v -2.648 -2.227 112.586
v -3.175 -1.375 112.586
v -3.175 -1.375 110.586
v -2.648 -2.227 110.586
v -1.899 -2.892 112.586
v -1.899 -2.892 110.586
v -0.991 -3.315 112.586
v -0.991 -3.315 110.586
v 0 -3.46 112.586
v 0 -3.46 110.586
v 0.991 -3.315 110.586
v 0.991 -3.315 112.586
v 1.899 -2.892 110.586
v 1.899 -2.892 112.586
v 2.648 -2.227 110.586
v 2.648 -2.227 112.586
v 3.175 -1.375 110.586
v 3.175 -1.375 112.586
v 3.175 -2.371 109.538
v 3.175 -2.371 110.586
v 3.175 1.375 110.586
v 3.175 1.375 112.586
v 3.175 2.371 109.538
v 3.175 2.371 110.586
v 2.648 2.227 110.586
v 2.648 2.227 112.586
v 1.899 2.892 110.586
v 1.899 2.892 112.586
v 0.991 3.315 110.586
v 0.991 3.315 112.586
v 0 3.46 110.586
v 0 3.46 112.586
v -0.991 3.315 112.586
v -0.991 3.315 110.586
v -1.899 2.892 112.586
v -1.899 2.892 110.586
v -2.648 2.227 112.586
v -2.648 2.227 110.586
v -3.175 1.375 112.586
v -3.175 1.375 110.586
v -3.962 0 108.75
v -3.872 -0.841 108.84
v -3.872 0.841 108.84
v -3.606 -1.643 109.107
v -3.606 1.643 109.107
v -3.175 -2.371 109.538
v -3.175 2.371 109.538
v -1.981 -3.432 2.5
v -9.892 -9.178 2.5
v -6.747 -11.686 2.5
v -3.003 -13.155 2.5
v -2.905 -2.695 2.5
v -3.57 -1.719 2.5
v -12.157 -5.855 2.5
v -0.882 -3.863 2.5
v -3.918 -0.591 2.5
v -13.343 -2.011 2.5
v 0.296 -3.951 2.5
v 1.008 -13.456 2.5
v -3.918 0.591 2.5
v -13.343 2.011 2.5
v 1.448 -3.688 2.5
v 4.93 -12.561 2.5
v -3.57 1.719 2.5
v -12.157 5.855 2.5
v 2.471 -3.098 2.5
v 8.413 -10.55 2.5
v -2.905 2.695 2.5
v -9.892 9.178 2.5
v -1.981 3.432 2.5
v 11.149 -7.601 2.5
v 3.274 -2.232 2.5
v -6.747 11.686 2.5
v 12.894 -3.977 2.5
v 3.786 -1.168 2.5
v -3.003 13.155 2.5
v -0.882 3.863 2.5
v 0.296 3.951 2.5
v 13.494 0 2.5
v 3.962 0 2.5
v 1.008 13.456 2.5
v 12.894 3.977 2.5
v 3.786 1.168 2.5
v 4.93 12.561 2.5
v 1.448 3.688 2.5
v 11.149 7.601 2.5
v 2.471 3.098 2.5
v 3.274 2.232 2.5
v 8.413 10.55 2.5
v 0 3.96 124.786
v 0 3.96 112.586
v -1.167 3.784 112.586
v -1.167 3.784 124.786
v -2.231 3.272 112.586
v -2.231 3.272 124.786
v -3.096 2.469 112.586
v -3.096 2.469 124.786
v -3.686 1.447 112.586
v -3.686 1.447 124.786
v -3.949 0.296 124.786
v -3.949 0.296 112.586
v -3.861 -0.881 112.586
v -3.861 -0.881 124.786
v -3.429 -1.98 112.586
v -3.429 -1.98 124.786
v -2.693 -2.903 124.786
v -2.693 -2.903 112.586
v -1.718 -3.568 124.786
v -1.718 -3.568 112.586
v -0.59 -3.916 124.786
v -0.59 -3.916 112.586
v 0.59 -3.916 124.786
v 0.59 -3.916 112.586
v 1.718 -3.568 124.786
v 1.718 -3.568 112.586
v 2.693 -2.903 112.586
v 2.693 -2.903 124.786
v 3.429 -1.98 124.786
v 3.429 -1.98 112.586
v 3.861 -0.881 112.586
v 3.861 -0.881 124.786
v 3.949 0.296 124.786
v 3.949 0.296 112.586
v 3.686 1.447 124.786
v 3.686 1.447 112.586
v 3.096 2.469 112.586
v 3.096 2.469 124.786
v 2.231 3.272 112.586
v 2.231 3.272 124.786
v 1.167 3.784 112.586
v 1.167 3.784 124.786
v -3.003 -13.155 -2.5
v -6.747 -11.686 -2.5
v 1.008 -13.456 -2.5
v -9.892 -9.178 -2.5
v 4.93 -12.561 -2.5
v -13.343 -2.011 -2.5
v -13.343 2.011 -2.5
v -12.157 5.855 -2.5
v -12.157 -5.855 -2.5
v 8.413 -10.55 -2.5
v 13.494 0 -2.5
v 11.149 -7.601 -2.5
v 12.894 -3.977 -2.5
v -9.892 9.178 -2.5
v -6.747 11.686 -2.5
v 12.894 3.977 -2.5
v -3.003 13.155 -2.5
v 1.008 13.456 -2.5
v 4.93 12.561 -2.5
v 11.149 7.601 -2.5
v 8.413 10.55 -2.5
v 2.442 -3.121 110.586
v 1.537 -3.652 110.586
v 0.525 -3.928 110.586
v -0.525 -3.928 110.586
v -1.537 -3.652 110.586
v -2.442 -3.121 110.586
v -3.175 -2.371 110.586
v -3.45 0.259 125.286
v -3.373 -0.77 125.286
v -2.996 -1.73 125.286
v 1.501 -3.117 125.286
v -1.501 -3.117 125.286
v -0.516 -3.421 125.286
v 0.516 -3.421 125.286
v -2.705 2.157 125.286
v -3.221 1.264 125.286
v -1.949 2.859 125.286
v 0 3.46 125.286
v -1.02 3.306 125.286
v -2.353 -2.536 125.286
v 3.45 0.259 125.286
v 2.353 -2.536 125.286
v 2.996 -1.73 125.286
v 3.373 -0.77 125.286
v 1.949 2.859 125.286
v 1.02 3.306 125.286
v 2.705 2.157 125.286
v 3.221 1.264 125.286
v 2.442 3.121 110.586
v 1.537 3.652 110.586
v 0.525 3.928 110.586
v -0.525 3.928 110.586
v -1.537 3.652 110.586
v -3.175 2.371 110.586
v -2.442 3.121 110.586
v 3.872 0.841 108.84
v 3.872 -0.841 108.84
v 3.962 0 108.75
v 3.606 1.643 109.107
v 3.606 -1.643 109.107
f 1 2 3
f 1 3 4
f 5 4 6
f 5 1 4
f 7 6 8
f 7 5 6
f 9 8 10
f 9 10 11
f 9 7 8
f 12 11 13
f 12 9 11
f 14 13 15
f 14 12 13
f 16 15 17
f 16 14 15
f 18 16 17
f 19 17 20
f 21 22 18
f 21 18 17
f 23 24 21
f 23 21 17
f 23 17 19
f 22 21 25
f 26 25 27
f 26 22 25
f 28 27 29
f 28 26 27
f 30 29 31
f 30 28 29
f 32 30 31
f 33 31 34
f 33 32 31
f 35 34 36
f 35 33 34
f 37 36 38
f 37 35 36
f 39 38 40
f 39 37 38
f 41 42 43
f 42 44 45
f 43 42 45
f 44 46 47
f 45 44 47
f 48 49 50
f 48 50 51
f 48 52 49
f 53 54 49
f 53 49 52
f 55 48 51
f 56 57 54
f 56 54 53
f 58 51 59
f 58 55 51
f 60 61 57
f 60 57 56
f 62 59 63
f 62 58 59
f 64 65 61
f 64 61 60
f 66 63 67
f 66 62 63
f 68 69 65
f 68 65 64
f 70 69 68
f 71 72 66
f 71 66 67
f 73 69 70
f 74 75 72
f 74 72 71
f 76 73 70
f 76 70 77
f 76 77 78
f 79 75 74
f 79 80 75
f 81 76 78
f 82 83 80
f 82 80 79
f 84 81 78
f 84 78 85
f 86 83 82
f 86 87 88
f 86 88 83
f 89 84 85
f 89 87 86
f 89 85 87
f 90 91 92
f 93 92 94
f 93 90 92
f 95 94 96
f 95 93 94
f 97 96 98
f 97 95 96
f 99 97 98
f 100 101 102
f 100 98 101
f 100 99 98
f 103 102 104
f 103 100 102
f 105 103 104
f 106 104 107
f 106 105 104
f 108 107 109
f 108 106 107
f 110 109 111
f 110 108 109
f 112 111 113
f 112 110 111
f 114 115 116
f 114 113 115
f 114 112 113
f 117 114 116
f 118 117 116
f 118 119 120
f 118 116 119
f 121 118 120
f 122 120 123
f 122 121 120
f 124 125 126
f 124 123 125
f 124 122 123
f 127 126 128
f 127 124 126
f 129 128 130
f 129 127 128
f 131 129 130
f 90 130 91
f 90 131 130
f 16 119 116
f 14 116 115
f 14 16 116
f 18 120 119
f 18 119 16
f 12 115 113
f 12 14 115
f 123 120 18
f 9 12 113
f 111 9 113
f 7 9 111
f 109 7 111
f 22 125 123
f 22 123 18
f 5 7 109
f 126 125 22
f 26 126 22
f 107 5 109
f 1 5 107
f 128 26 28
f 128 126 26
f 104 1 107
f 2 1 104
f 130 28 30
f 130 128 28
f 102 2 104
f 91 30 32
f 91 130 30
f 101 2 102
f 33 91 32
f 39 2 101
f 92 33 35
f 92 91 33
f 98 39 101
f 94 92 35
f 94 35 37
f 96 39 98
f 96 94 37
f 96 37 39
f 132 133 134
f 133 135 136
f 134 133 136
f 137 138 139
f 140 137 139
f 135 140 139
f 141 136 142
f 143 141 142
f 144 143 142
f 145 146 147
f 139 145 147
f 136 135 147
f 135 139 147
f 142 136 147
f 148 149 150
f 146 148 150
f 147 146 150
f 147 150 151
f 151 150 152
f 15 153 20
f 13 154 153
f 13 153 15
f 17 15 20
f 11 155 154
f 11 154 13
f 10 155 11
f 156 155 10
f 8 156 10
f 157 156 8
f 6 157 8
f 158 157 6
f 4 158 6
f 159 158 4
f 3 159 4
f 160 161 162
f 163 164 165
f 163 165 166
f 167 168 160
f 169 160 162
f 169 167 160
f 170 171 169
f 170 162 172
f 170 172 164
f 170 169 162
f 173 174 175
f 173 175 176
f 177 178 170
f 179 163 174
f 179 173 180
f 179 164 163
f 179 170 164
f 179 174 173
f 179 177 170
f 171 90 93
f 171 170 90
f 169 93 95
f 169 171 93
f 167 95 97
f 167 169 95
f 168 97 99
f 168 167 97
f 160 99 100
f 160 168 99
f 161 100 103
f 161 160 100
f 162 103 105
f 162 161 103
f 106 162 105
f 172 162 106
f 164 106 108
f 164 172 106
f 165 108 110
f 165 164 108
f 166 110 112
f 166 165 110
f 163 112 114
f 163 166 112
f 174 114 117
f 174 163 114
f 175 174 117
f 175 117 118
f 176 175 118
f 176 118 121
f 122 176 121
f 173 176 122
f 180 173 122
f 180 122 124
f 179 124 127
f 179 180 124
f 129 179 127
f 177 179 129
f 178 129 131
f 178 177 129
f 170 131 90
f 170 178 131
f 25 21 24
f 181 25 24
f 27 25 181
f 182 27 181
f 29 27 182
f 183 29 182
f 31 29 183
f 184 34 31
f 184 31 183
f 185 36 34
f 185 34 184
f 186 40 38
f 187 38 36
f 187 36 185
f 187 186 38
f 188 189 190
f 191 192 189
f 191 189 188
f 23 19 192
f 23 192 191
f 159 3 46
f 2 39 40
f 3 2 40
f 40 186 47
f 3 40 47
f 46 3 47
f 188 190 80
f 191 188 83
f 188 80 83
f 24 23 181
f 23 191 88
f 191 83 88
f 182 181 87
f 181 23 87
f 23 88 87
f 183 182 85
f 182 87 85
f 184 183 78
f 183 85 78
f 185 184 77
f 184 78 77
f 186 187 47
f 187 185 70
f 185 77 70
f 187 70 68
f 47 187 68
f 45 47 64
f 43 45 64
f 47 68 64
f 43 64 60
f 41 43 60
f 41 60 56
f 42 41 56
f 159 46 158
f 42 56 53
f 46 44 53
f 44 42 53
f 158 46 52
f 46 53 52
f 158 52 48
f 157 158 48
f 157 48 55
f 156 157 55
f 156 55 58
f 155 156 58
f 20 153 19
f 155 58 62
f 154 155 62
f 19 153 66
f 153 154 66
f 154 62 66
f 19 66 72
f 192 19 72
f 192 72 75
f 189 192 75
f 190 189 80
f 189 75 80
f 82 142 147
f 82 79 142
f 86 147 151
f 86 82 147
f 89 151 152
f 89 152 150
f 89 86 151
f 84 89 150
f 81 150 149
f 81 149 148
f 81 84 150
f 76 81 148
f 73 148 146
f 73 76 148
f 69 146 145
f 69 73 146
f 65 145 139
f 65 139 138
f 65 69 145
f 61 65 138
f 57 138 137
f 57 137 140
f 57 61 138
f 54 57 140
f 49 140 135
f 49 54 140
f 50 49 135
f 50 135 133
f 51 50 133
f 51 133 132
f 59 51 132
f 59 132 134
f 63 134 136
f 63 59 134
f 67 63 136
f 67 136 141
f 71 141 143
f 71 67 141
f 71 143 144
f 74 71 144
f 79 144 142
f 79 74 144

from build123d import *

# Parameters (mm, degrees)
SKETCH1_R        = 3.9624
EXTRUDE1_DEPTH   = 125.2855
SKETCH2_R        = 13.49375
PISTON_DEPTH     = 2.5
FLATS_DEPTH      = 14.49375
FLATS_DEPTH_BACK = 14.49375


with BuildPart() as part:
    # Sketch1 → Extrude1 (new body)
    with BuildSketch(Plane.XY):
        Circle(SKETCH1_R)
    extrude(amount=EXTRUDE1_DEPTH)

    # Sketch2 → Piston (add, symmetric)
    with BuildSketch(Plane.XY):
        Circle(SKETCH2_R)
    extrude(amount=PISTON_DEPTH, both=True)

    # Sketch3 → Threads (revolve, cut)
    with BuildSketch(Plane(origin=(0, 0, 0), x_dir=(0, 0, -1), z_dir=(1, 0, 0))):
        Polygon((-125.2855, 13.49375), (-110.5855, 13.49375), (-110.5855, 3.46), (-112.5855, 3.46), (-112.5855, 3.96), (-124.7855, 3.96), (-125.2855, 3.46), align=None)
    revolve(axis=Axis((0, 0, 0), (0, 0, 1)), mode=Mode.SUBTRACT)

    # Sketch4 → Flats (cut, two sides)
    with BuildSketch(Plane(origin=(0, 0, 0), x_dir=(1, 0, 0), z_dir=(0, 1, 0))) as flats_sk:
        Polygon((3.9624, -112.5855), (3.175, -112.5855), (3.175, -109.5375), (3.9624, -108.7501), align=None)
        Polygon((-3.9624, -108.7501), (-3.9624, -112.5855), (-3.175, -112.5855), (-3.175, -109.5375), align=None)
    extrude(amount=FLATS_DEPTH, mode=Mode.SUBTRACT)
    extrude(flats_sk.sketch, amount=-FLATS_DEPTH_BACK, mode=Mode.SUBTRACT)


solid = part.part
